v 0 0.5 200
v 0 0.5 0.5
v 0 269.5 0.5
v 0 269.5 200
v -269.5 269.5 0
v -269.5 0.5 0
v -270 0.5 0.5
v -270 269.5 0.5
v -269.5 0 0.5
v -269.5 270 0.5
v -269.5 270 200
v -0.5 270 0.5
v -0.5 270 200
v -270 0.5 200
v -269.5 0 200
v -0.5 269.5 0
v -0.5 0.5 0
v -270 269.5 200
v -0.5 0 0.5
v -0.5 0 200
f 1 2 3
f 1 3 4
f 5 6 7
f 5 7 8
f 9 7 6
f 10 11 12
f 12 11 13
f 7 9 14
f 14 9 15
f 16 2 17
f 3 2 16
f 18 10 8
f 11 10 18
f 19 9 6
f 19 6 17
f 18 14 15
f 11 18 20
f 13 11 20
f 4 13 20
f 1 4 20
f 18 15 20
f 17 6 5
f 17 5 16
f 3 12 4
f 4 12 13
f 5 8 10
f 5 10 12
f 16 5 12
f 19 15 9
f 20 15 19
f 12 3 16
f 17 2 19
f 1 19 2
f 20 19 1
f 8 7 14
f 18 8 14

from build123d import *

# Parameters (mm, degrees)
F0_W     = 270
F0_H     = 200
F1_DEPTH = 270
F2_SIZE  = 0.5


with BuildPart() as f1:
    # F0 (on Front) → F1 (new body)
    with BuildSketch(Plane.XZ):
        with Locations((-135, 100)):
            Rectangle(F0_W, F0_H)
    extrude(amount=-F1_DEPTH)

    # F2
    f2_edges = [f1.edges().sort_by_distance(p)[0] for p in [
        (0, 0, 100),
        (0, 270, 100),
        (-270, 0, 100),
        (-270, 270, 100),
        (-270, 135, 0),
        (0, 135, 0),
        (-135, 0, 0),
        (-135, 270, 0),
    ]]
    chamfer(f2_edges, length=F2_SIZE)


solid = f1.part
